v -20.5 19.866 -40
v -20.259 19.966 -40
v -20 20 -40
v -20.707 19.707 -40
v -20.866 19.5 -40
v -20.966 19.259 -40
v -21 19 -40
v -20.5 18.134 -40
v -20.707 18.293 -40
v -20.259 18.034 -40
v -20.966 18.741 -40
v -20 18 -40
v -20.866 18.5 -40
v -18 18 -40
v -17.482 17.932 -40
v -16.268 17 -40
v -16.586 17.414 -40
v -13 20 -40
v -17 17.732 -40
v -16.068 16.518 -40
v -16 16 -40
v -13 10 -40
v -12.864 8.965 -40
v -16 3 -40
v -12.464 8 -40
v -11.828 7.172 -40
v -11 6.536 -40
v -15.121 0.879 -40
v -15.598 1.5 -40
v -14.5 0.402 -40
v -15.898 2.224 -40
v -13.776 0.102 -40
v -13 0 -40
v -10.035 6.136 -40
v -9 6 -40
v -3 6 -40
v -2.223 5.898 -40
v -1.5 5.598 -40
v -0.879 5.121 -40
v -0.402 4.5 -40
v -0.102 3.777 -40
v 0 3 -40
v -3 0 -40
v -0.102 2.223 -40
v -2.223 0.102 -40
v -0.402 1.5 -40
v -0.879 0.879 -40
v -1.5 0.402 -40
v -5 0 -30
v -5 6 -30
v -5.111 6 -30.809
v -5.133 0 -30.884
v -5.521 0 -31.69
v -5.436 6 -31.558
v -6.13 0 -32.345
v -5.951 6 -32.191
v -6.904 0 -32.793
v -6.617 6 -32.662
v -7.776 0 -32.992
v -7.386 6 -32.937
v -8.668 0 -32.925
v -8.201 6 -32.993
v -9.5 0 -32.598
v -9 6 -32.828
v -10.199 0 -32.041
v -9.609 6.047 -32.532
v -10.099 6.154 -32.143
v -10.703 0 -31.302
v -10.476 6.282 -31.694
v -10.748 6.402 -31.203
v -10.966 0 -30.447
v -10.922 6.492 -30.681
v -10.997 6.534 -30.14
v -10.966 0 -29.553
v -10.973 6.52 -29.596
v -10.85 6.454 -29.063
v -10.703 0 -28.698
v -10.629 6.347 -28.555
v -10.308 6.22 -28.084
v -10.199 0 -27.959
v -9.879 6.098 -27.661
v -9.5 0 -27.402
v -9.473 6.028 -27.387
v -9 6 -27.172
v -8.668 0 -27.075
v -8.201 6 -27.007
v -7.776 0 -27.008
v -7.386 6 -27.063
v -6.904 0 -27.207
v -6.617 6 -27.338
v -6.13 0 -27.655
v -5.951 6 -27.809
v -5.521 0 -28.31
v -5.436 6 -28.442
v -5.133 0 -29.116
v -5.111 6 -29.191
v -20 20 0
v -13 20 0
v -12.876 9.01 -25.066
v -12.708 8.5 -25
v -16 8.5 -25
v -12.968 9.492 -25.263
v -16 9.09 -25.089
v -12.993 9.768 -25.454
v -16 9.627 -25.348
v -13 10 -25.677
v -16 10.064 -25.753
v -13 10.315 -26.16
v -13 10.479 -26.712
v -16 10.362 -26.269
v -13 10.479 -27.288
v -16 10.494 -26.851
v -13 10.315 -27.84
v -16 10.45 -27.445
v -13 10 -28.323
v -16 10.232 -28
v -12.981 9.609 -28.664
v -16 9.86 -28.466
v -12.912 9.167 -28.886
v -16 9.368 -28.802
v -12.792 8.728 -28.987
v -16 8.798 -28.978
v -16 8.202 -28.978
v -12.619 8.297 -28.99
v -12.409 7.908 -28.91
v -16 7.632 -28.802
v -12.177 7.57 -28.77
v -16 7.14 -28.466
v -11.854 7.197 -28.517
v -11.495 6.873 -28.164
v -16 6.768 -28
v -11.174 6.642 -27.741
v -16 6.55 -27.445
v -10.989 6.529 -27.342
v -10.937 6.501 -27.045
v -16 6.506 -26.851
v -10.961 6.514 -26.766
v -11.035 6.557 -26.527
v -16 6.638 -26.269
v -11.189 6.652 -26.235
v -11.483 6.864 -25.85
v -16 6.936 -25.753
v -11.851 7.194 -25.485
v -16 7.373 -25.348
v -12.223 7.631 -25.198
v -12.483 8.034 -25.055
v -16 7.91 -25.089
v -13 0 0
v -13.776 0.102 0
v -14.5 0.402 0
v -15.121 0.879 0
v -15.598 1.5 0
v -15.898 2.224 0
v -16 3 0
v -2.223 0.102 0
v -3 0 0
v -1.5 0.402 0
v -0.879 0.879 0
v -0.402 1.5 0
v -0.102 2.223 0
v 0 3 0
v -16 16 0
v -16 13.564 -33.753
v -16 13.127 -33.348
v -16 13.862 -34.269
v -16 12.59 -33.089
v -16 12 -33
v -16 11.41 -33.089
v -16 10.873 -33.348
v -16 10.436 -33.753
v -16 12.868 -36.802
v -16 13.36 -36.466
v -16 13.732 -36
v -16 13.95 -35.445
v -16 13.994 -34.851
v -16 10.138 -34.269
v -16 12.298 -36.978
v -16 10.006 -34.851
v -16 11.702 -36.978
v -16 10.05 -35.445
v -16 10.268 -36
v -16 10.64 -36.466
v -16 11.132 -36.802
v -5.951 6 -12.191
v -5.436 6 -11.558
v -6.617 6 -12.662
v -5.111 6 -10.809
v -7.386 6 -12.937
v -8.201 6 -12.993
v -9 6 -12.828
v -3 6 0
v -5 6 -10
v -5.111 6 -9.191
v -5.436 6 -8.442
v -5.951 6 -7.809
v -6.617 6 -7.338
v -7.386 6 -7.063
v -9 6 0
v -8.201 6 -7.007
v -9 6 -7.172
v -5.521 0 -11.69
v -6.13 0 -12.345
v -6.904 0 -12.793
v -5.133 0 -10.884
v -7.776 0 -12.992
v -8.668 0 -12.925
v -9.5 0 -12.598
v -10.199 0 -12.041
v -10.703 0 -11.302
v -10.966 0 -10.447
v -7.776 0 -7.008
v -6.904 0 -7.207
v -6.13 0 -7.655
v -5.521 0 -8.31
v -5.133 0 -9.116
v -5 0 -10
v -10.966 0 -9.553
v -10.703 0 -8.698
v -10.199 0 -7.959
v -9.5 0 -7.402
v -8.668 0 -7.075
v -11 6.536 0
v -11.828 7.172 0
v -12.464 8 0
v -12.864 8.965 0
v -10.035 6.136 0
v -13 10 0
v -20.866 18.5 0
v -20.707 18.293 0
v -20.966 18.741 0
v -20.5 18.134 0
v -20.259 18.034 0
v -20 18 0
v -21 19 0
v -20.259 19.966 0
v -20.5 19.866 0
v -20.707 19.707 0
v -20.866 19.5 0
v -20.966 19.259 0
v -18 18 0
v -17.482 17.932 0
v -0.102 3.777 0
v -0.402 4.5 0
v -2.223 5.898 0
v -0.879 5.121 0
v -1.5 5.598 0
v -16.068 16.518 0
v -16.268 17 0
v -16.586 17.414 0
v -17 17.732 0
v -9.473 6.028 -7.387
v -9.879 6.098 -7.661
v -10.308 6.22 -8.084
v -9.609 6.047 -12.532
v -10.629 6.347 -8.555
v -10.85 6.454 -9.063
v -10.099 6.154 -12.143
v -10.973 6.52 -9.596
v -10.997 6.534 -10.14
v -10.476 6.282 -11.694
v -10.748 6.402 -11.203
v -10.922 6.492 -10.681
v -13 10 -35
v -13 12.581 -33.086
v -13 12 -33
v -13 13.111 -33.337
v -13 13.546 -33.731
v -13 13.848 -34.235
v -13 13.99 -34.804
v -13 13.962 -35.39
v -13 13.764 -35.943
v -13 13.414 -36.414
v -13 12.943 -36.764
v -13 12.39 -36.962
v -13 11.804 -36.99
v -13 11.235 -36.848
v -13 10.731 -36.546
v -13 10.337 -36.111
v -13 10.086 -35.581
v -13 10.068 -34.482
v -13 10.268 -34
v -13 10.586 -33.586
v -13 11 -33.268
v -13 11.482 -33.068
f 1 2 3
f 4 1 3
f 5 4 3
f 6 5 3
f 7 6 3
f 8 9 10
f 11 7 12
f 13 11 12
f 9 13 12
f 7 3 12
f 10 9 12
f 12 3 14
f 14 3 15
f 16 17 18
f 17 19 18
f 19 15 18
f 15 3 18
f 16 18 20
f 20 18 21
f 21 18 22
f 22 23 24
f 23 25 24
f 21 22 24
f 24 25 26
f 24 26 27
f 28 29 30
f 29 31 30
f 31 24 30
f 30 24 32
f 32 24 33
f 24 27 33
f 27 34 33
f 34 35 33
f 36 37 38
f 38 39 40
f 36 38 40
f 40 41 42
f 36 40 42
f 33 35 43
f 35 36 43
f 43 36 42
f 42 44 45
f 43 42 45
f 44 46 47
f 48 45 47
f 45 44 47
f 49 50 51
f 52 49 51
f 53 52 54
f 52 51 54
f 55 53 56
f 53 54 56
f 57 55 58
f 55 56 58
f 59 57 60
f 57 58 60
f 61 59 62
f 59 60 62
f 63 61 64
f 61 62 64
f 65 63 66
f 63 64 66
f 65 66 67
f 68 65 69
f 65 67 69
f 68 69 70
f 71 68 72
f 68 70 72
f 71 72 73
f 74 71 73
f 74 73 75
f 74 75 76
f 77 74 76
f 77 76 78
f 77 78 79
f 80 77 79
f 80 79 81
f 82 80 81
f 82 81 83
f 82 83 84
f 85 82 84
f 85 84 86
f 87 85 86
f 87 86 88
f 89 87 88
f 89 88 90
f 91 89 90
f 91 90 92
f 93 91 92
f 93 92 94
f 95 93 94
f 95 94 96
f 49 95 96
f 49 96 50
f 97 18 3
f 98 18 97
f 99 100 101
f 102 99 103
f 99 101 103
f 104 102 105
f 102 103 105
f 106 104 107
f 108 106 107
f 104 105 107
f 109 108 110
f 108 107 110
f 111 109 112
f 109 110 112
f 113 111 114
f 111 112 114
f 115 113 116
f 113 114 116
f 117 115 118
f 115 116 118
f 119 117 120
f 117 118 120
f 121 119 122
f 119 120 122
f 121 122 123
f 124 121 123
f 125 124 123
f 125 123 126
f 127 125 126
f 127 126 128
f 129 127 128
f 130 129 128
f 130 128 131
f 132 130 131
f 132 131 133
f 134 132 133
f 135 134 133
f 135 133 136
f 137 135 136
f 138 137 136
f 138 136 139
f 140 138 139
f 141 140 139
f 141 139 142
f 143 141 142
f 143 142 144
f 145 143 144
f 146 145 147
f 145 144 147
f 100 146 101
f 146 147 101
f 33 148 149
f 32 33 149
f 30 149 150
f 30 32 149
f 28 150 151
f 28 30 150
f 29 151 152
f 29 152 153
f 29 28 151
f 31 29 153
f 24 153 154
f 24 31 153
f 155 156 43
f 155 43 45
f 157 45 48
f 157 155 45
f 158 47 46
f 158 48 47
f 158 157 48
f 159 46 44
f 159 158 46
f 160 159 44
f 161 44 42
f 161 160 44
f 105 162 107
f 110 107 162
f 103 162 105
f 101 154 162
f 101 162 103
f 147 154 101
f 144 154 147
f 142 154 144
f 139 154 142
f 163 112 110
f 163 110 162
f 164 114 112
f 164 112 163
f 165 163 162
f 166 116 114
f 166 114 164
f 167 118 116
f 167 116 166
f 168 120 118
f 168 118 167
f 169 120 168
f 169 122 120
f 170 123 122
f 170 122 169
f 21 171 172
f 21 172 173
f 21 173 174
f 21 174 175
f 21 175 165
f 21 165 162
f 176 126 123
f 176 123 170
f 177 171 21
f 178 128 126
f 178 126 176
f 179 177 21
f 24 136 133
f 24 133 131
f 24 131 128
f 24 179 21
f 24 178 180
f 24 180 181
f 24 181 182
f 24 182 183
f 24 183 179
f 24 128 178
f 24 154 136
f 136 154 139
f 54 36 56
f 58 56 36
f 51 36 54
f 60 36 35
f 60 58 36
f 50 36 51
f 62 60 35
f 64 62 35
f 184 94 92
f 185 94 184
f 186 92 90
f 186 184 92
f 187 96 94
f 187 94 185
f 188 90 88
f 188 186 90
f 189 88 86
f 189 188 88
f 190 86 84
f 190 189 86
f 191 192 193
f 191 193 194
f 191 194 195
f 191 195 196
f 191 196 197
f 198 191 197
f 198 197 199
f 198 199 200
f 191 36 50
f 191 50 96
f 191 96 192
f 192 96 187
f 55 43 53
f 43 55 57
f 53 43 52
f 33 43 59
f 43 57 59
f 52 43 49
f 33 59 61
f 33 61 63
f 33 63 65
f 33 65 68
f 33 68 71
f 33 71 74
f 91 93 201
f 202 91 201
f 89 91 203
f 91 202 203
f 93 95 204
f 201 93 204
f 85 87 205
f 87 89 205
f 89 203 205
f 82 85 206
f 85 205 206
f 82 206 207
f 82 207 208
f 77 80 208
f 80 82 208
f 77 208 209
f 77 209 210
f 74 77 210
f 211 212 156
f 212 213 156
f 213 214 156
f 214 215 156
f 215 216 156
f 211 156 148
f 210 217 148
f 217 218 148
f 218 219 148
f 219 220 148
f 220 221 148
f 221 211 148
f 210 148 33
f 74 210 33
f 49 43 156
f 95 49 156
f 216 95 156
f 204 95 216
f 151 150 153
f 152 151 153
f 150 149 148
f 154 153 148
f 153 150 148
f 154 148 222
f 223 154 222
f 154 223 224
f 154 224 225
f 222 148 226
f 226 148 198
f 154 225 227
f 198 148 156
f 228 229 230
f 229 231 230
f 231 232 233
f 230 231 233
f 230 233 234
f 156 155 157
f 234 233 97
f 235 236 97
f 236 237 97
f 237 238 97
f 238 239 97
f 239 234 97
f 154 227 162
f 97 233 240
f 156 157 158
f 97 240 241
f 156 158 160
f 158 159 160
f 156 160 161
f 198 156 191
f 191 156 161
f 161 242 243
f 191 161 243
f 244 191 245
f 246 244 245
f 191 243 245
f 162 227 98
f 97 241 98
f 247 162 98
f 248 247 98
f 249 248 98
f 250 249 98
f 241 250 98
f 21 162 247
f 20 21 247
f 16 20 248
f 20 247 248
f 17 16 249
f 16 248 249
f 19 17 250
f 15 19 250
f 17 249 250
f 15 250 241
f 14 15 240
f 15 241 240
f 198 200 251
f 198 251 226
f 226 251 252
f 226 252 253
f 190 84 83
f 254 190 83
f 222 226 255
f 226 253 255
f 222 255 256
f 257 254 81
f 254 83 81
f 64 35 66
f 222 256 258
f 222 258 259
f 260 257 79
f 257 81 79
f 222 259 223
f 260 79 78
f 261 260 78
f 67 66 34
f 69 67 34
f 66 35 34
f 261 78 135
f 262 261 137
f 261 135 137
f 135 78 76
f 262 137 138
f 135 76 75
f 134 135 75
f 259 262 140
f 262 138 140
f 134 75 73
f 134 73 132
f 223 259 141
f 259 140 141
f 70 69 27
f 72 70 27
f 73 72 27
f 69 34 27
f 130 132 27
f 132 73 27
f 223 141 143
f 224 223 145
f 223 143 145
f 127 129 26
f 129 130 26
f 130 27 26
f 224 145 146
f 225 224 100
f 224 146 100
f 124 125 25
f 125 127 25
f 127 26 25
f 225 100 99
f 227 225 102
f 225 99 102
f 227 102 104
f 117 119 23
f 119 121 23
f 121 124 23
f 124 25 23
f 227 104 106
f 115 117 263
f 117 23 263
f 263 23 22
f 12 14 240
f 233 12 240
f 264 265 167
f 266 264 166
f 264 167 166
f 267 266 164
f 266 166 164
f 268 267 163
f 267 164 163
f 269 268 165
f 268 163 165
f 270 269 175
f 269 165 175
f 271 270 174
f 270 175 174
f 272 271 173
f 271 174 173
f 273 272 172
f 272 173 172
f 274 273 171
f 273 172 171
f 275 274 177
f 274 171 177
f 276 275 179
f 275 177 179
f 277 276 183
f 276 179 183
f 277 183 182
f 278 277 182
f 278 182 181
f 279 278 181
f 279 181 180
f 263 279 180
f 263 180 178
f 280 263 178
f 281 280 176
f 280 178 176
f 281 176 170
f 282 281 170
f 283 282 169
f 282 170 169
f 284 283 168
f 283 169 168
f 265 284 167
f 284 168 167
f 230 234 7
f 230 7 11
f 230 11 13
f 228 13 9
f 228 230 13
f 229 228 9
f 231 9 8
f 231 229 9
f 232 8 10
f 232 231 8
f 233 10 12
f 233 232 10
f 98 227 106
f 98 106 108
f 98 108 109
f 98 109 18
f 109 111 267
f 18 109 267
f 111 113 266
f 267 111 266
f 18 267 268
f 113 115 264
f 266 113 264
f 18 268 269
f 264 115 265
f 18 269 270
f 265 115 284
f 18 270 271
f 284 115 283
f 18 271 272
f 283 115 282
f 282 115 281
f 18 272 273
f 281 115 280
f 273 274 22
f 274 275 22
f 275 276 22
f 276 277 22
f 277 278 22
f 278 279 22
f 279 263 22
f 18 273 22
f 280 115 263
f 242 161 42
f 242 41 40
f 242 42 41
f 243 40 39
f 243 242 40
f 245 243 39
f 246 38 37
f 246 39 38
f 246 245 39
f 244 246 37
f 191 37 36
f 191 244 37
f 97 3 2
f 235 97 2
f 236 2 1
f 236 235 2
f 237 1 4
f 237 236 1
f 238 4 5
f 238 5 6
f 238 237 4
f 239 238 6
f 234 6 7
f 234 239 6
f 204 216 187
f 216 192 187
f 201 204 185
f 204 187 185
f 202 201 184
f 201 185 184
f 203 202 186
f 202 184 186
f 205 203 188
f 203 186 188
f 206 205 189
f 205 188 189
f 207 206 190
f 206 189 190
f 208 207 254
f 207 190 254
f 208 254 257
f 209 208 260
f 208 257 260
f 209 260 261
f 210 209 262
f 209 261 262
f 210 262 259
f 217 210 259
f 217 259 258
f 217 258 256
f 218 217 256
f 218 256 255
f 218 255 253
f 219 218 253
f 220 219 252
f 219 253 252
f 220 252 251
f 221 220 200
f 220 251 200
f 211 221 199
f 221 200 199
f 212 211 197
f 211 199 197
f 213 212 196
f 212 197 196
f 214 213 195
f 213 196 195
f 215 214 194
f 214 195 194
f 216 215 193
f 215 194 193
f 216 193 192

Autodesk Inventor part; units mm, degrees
ref_plane "YZ Plane" through (0, 0, 0) normal (1, 0, 0) x (0, 1, 0)
ref_plane "XZ Plane" through (0, 0, 0) normal (0, 1, 0) x (-1, 0, 0)
ref_plane "XY Plane" through (0, 0, 0) normal (0, 0, 1) x (1, 0, 0)
sketch "Sketch1" plane through (0, 0, 0) normal (0, 1, 0) x (-1, 0, 0)
  line L0 (0, 0) -> (16, 0)
  line L1 (16, 0) -> (16, -40)
  line L2 (16, -40) -> (0, -40)
  line L3 (0, -40) -> (0, 0)
  dimension "d0" = 16
  dimension "d1" = 40
extrude "Extrusion1" add sketch "Sketch1" along normal blind 6
sketch "Sketch2" plane through (0, 6, 0) normal (0, 1, 0) x (1, 0, 0)
  line L0 (-16, 0) -> (0, 0) projected
  line L1 (0, 40) -> (-16, 40) projected
  line L2 (-16, 0) -> (-13, 0)
  line L3 (-13, 0) -> (-13, 40)
  line L4 (-13, 40) -> (-16, 40)
  line L5 (-16, 40) -> (-16, 0)
  dimension "d4" = 3
extrude "Extrusion2" add sketch "Sketch2" along normal blind 14
sketch "Sketch3" plane through (-16, 0, -40) normal (-1, 0, 0) x (0, 0, 1)
  line L0 (0, 20) -> (40, 20) projected
  line L1 (40, 20) -> (0, 20)
  line L2 (0, 20) -> (0, 18)
  line L3 (0, 18) -> (40, 18)
  line L4 (40, 18) -> (40, 20)
  point P0 (40, 0)
  point P1 (0, 20)
  dimension "d7" = 40
  dimension "d8" = 2
extrude "Extrusion3" add sketch "Sketch3" along normal blind 5
fillet "Fillet1" radius 1 2 edges at (-21, 20, -20) (-21, 18, -20)
fillet "Fillet2" radius 4 1 edges at (-13, 6, -20)
fillet "Fillet3" radius 3 2 edges at (0, 6, -20) (0, 0, -20)
fillet "Fillet4" radius 3 1 edges at (-16, 0, -20)
sketch "Sketch4" plane through (0, 6, 0) normal (0, 1, 0) x (1, 0, 0)
  line L0 (-8, 0) -> (-8, 10)
  line L1 (-3, 40) -> (-13, 40) projected
  circle A0 centre (-8, 10) radius 3
  line L2 (-8, 40) -> (-8, 30)
  line L3 (-8, 40) -> (2, 40) construction
  circle A1 centre (-8, 30) radius 3
  point P0 (0, 0)
  dimension "d15" = 10
  dimension "d16" = 6
  dimension "d17" = 10
  dimension "d18" = 90
  dimension "d19" = 5
  dimension "d20" = 6
  dimension "d23" = 5
extrude "Extrusion4" cut sketch "Sketch4" against normal through all both and the other way through all
fillet "Fillet5" radius 2 1 edges at (-16, 18, -20)
sketch "Sketch5" plane through (-16, 3, -40) normal (-1, 0, 0) x (0, 0, 1)
  line L0 (0, 5.5) -> (5, 5.5)
  line L1 (5, 5.5) -> (5, 9)
  line L2 (5, 5.5) -> (8.5, 5.5) construction
  line L3 (5, 5.5) -> (13, 5.5)
  circle A0 centre (5, 9) radius 2
  circle A1 centre (13, 5.5) radius 2
  line L4 (40, 0) -> (0, 0) projected
  line L5 (0, 7) -> (0, 17) projected
  line L6 (0, -3) -> (40, -3) projected
  dimension "d25" = 5
  dimension "d28" = 3.5
  dimension "d29" = 90
  dimension "d30" = 8
  dimension "d32" = 4
  dimension "d33" = 4
  dimension "d38" = 8.5
extrude "Extrusion5" cut sketch "Sketch5" against normal through all both and the other way through all
properties part number "Cable_Guide_Support_small"
